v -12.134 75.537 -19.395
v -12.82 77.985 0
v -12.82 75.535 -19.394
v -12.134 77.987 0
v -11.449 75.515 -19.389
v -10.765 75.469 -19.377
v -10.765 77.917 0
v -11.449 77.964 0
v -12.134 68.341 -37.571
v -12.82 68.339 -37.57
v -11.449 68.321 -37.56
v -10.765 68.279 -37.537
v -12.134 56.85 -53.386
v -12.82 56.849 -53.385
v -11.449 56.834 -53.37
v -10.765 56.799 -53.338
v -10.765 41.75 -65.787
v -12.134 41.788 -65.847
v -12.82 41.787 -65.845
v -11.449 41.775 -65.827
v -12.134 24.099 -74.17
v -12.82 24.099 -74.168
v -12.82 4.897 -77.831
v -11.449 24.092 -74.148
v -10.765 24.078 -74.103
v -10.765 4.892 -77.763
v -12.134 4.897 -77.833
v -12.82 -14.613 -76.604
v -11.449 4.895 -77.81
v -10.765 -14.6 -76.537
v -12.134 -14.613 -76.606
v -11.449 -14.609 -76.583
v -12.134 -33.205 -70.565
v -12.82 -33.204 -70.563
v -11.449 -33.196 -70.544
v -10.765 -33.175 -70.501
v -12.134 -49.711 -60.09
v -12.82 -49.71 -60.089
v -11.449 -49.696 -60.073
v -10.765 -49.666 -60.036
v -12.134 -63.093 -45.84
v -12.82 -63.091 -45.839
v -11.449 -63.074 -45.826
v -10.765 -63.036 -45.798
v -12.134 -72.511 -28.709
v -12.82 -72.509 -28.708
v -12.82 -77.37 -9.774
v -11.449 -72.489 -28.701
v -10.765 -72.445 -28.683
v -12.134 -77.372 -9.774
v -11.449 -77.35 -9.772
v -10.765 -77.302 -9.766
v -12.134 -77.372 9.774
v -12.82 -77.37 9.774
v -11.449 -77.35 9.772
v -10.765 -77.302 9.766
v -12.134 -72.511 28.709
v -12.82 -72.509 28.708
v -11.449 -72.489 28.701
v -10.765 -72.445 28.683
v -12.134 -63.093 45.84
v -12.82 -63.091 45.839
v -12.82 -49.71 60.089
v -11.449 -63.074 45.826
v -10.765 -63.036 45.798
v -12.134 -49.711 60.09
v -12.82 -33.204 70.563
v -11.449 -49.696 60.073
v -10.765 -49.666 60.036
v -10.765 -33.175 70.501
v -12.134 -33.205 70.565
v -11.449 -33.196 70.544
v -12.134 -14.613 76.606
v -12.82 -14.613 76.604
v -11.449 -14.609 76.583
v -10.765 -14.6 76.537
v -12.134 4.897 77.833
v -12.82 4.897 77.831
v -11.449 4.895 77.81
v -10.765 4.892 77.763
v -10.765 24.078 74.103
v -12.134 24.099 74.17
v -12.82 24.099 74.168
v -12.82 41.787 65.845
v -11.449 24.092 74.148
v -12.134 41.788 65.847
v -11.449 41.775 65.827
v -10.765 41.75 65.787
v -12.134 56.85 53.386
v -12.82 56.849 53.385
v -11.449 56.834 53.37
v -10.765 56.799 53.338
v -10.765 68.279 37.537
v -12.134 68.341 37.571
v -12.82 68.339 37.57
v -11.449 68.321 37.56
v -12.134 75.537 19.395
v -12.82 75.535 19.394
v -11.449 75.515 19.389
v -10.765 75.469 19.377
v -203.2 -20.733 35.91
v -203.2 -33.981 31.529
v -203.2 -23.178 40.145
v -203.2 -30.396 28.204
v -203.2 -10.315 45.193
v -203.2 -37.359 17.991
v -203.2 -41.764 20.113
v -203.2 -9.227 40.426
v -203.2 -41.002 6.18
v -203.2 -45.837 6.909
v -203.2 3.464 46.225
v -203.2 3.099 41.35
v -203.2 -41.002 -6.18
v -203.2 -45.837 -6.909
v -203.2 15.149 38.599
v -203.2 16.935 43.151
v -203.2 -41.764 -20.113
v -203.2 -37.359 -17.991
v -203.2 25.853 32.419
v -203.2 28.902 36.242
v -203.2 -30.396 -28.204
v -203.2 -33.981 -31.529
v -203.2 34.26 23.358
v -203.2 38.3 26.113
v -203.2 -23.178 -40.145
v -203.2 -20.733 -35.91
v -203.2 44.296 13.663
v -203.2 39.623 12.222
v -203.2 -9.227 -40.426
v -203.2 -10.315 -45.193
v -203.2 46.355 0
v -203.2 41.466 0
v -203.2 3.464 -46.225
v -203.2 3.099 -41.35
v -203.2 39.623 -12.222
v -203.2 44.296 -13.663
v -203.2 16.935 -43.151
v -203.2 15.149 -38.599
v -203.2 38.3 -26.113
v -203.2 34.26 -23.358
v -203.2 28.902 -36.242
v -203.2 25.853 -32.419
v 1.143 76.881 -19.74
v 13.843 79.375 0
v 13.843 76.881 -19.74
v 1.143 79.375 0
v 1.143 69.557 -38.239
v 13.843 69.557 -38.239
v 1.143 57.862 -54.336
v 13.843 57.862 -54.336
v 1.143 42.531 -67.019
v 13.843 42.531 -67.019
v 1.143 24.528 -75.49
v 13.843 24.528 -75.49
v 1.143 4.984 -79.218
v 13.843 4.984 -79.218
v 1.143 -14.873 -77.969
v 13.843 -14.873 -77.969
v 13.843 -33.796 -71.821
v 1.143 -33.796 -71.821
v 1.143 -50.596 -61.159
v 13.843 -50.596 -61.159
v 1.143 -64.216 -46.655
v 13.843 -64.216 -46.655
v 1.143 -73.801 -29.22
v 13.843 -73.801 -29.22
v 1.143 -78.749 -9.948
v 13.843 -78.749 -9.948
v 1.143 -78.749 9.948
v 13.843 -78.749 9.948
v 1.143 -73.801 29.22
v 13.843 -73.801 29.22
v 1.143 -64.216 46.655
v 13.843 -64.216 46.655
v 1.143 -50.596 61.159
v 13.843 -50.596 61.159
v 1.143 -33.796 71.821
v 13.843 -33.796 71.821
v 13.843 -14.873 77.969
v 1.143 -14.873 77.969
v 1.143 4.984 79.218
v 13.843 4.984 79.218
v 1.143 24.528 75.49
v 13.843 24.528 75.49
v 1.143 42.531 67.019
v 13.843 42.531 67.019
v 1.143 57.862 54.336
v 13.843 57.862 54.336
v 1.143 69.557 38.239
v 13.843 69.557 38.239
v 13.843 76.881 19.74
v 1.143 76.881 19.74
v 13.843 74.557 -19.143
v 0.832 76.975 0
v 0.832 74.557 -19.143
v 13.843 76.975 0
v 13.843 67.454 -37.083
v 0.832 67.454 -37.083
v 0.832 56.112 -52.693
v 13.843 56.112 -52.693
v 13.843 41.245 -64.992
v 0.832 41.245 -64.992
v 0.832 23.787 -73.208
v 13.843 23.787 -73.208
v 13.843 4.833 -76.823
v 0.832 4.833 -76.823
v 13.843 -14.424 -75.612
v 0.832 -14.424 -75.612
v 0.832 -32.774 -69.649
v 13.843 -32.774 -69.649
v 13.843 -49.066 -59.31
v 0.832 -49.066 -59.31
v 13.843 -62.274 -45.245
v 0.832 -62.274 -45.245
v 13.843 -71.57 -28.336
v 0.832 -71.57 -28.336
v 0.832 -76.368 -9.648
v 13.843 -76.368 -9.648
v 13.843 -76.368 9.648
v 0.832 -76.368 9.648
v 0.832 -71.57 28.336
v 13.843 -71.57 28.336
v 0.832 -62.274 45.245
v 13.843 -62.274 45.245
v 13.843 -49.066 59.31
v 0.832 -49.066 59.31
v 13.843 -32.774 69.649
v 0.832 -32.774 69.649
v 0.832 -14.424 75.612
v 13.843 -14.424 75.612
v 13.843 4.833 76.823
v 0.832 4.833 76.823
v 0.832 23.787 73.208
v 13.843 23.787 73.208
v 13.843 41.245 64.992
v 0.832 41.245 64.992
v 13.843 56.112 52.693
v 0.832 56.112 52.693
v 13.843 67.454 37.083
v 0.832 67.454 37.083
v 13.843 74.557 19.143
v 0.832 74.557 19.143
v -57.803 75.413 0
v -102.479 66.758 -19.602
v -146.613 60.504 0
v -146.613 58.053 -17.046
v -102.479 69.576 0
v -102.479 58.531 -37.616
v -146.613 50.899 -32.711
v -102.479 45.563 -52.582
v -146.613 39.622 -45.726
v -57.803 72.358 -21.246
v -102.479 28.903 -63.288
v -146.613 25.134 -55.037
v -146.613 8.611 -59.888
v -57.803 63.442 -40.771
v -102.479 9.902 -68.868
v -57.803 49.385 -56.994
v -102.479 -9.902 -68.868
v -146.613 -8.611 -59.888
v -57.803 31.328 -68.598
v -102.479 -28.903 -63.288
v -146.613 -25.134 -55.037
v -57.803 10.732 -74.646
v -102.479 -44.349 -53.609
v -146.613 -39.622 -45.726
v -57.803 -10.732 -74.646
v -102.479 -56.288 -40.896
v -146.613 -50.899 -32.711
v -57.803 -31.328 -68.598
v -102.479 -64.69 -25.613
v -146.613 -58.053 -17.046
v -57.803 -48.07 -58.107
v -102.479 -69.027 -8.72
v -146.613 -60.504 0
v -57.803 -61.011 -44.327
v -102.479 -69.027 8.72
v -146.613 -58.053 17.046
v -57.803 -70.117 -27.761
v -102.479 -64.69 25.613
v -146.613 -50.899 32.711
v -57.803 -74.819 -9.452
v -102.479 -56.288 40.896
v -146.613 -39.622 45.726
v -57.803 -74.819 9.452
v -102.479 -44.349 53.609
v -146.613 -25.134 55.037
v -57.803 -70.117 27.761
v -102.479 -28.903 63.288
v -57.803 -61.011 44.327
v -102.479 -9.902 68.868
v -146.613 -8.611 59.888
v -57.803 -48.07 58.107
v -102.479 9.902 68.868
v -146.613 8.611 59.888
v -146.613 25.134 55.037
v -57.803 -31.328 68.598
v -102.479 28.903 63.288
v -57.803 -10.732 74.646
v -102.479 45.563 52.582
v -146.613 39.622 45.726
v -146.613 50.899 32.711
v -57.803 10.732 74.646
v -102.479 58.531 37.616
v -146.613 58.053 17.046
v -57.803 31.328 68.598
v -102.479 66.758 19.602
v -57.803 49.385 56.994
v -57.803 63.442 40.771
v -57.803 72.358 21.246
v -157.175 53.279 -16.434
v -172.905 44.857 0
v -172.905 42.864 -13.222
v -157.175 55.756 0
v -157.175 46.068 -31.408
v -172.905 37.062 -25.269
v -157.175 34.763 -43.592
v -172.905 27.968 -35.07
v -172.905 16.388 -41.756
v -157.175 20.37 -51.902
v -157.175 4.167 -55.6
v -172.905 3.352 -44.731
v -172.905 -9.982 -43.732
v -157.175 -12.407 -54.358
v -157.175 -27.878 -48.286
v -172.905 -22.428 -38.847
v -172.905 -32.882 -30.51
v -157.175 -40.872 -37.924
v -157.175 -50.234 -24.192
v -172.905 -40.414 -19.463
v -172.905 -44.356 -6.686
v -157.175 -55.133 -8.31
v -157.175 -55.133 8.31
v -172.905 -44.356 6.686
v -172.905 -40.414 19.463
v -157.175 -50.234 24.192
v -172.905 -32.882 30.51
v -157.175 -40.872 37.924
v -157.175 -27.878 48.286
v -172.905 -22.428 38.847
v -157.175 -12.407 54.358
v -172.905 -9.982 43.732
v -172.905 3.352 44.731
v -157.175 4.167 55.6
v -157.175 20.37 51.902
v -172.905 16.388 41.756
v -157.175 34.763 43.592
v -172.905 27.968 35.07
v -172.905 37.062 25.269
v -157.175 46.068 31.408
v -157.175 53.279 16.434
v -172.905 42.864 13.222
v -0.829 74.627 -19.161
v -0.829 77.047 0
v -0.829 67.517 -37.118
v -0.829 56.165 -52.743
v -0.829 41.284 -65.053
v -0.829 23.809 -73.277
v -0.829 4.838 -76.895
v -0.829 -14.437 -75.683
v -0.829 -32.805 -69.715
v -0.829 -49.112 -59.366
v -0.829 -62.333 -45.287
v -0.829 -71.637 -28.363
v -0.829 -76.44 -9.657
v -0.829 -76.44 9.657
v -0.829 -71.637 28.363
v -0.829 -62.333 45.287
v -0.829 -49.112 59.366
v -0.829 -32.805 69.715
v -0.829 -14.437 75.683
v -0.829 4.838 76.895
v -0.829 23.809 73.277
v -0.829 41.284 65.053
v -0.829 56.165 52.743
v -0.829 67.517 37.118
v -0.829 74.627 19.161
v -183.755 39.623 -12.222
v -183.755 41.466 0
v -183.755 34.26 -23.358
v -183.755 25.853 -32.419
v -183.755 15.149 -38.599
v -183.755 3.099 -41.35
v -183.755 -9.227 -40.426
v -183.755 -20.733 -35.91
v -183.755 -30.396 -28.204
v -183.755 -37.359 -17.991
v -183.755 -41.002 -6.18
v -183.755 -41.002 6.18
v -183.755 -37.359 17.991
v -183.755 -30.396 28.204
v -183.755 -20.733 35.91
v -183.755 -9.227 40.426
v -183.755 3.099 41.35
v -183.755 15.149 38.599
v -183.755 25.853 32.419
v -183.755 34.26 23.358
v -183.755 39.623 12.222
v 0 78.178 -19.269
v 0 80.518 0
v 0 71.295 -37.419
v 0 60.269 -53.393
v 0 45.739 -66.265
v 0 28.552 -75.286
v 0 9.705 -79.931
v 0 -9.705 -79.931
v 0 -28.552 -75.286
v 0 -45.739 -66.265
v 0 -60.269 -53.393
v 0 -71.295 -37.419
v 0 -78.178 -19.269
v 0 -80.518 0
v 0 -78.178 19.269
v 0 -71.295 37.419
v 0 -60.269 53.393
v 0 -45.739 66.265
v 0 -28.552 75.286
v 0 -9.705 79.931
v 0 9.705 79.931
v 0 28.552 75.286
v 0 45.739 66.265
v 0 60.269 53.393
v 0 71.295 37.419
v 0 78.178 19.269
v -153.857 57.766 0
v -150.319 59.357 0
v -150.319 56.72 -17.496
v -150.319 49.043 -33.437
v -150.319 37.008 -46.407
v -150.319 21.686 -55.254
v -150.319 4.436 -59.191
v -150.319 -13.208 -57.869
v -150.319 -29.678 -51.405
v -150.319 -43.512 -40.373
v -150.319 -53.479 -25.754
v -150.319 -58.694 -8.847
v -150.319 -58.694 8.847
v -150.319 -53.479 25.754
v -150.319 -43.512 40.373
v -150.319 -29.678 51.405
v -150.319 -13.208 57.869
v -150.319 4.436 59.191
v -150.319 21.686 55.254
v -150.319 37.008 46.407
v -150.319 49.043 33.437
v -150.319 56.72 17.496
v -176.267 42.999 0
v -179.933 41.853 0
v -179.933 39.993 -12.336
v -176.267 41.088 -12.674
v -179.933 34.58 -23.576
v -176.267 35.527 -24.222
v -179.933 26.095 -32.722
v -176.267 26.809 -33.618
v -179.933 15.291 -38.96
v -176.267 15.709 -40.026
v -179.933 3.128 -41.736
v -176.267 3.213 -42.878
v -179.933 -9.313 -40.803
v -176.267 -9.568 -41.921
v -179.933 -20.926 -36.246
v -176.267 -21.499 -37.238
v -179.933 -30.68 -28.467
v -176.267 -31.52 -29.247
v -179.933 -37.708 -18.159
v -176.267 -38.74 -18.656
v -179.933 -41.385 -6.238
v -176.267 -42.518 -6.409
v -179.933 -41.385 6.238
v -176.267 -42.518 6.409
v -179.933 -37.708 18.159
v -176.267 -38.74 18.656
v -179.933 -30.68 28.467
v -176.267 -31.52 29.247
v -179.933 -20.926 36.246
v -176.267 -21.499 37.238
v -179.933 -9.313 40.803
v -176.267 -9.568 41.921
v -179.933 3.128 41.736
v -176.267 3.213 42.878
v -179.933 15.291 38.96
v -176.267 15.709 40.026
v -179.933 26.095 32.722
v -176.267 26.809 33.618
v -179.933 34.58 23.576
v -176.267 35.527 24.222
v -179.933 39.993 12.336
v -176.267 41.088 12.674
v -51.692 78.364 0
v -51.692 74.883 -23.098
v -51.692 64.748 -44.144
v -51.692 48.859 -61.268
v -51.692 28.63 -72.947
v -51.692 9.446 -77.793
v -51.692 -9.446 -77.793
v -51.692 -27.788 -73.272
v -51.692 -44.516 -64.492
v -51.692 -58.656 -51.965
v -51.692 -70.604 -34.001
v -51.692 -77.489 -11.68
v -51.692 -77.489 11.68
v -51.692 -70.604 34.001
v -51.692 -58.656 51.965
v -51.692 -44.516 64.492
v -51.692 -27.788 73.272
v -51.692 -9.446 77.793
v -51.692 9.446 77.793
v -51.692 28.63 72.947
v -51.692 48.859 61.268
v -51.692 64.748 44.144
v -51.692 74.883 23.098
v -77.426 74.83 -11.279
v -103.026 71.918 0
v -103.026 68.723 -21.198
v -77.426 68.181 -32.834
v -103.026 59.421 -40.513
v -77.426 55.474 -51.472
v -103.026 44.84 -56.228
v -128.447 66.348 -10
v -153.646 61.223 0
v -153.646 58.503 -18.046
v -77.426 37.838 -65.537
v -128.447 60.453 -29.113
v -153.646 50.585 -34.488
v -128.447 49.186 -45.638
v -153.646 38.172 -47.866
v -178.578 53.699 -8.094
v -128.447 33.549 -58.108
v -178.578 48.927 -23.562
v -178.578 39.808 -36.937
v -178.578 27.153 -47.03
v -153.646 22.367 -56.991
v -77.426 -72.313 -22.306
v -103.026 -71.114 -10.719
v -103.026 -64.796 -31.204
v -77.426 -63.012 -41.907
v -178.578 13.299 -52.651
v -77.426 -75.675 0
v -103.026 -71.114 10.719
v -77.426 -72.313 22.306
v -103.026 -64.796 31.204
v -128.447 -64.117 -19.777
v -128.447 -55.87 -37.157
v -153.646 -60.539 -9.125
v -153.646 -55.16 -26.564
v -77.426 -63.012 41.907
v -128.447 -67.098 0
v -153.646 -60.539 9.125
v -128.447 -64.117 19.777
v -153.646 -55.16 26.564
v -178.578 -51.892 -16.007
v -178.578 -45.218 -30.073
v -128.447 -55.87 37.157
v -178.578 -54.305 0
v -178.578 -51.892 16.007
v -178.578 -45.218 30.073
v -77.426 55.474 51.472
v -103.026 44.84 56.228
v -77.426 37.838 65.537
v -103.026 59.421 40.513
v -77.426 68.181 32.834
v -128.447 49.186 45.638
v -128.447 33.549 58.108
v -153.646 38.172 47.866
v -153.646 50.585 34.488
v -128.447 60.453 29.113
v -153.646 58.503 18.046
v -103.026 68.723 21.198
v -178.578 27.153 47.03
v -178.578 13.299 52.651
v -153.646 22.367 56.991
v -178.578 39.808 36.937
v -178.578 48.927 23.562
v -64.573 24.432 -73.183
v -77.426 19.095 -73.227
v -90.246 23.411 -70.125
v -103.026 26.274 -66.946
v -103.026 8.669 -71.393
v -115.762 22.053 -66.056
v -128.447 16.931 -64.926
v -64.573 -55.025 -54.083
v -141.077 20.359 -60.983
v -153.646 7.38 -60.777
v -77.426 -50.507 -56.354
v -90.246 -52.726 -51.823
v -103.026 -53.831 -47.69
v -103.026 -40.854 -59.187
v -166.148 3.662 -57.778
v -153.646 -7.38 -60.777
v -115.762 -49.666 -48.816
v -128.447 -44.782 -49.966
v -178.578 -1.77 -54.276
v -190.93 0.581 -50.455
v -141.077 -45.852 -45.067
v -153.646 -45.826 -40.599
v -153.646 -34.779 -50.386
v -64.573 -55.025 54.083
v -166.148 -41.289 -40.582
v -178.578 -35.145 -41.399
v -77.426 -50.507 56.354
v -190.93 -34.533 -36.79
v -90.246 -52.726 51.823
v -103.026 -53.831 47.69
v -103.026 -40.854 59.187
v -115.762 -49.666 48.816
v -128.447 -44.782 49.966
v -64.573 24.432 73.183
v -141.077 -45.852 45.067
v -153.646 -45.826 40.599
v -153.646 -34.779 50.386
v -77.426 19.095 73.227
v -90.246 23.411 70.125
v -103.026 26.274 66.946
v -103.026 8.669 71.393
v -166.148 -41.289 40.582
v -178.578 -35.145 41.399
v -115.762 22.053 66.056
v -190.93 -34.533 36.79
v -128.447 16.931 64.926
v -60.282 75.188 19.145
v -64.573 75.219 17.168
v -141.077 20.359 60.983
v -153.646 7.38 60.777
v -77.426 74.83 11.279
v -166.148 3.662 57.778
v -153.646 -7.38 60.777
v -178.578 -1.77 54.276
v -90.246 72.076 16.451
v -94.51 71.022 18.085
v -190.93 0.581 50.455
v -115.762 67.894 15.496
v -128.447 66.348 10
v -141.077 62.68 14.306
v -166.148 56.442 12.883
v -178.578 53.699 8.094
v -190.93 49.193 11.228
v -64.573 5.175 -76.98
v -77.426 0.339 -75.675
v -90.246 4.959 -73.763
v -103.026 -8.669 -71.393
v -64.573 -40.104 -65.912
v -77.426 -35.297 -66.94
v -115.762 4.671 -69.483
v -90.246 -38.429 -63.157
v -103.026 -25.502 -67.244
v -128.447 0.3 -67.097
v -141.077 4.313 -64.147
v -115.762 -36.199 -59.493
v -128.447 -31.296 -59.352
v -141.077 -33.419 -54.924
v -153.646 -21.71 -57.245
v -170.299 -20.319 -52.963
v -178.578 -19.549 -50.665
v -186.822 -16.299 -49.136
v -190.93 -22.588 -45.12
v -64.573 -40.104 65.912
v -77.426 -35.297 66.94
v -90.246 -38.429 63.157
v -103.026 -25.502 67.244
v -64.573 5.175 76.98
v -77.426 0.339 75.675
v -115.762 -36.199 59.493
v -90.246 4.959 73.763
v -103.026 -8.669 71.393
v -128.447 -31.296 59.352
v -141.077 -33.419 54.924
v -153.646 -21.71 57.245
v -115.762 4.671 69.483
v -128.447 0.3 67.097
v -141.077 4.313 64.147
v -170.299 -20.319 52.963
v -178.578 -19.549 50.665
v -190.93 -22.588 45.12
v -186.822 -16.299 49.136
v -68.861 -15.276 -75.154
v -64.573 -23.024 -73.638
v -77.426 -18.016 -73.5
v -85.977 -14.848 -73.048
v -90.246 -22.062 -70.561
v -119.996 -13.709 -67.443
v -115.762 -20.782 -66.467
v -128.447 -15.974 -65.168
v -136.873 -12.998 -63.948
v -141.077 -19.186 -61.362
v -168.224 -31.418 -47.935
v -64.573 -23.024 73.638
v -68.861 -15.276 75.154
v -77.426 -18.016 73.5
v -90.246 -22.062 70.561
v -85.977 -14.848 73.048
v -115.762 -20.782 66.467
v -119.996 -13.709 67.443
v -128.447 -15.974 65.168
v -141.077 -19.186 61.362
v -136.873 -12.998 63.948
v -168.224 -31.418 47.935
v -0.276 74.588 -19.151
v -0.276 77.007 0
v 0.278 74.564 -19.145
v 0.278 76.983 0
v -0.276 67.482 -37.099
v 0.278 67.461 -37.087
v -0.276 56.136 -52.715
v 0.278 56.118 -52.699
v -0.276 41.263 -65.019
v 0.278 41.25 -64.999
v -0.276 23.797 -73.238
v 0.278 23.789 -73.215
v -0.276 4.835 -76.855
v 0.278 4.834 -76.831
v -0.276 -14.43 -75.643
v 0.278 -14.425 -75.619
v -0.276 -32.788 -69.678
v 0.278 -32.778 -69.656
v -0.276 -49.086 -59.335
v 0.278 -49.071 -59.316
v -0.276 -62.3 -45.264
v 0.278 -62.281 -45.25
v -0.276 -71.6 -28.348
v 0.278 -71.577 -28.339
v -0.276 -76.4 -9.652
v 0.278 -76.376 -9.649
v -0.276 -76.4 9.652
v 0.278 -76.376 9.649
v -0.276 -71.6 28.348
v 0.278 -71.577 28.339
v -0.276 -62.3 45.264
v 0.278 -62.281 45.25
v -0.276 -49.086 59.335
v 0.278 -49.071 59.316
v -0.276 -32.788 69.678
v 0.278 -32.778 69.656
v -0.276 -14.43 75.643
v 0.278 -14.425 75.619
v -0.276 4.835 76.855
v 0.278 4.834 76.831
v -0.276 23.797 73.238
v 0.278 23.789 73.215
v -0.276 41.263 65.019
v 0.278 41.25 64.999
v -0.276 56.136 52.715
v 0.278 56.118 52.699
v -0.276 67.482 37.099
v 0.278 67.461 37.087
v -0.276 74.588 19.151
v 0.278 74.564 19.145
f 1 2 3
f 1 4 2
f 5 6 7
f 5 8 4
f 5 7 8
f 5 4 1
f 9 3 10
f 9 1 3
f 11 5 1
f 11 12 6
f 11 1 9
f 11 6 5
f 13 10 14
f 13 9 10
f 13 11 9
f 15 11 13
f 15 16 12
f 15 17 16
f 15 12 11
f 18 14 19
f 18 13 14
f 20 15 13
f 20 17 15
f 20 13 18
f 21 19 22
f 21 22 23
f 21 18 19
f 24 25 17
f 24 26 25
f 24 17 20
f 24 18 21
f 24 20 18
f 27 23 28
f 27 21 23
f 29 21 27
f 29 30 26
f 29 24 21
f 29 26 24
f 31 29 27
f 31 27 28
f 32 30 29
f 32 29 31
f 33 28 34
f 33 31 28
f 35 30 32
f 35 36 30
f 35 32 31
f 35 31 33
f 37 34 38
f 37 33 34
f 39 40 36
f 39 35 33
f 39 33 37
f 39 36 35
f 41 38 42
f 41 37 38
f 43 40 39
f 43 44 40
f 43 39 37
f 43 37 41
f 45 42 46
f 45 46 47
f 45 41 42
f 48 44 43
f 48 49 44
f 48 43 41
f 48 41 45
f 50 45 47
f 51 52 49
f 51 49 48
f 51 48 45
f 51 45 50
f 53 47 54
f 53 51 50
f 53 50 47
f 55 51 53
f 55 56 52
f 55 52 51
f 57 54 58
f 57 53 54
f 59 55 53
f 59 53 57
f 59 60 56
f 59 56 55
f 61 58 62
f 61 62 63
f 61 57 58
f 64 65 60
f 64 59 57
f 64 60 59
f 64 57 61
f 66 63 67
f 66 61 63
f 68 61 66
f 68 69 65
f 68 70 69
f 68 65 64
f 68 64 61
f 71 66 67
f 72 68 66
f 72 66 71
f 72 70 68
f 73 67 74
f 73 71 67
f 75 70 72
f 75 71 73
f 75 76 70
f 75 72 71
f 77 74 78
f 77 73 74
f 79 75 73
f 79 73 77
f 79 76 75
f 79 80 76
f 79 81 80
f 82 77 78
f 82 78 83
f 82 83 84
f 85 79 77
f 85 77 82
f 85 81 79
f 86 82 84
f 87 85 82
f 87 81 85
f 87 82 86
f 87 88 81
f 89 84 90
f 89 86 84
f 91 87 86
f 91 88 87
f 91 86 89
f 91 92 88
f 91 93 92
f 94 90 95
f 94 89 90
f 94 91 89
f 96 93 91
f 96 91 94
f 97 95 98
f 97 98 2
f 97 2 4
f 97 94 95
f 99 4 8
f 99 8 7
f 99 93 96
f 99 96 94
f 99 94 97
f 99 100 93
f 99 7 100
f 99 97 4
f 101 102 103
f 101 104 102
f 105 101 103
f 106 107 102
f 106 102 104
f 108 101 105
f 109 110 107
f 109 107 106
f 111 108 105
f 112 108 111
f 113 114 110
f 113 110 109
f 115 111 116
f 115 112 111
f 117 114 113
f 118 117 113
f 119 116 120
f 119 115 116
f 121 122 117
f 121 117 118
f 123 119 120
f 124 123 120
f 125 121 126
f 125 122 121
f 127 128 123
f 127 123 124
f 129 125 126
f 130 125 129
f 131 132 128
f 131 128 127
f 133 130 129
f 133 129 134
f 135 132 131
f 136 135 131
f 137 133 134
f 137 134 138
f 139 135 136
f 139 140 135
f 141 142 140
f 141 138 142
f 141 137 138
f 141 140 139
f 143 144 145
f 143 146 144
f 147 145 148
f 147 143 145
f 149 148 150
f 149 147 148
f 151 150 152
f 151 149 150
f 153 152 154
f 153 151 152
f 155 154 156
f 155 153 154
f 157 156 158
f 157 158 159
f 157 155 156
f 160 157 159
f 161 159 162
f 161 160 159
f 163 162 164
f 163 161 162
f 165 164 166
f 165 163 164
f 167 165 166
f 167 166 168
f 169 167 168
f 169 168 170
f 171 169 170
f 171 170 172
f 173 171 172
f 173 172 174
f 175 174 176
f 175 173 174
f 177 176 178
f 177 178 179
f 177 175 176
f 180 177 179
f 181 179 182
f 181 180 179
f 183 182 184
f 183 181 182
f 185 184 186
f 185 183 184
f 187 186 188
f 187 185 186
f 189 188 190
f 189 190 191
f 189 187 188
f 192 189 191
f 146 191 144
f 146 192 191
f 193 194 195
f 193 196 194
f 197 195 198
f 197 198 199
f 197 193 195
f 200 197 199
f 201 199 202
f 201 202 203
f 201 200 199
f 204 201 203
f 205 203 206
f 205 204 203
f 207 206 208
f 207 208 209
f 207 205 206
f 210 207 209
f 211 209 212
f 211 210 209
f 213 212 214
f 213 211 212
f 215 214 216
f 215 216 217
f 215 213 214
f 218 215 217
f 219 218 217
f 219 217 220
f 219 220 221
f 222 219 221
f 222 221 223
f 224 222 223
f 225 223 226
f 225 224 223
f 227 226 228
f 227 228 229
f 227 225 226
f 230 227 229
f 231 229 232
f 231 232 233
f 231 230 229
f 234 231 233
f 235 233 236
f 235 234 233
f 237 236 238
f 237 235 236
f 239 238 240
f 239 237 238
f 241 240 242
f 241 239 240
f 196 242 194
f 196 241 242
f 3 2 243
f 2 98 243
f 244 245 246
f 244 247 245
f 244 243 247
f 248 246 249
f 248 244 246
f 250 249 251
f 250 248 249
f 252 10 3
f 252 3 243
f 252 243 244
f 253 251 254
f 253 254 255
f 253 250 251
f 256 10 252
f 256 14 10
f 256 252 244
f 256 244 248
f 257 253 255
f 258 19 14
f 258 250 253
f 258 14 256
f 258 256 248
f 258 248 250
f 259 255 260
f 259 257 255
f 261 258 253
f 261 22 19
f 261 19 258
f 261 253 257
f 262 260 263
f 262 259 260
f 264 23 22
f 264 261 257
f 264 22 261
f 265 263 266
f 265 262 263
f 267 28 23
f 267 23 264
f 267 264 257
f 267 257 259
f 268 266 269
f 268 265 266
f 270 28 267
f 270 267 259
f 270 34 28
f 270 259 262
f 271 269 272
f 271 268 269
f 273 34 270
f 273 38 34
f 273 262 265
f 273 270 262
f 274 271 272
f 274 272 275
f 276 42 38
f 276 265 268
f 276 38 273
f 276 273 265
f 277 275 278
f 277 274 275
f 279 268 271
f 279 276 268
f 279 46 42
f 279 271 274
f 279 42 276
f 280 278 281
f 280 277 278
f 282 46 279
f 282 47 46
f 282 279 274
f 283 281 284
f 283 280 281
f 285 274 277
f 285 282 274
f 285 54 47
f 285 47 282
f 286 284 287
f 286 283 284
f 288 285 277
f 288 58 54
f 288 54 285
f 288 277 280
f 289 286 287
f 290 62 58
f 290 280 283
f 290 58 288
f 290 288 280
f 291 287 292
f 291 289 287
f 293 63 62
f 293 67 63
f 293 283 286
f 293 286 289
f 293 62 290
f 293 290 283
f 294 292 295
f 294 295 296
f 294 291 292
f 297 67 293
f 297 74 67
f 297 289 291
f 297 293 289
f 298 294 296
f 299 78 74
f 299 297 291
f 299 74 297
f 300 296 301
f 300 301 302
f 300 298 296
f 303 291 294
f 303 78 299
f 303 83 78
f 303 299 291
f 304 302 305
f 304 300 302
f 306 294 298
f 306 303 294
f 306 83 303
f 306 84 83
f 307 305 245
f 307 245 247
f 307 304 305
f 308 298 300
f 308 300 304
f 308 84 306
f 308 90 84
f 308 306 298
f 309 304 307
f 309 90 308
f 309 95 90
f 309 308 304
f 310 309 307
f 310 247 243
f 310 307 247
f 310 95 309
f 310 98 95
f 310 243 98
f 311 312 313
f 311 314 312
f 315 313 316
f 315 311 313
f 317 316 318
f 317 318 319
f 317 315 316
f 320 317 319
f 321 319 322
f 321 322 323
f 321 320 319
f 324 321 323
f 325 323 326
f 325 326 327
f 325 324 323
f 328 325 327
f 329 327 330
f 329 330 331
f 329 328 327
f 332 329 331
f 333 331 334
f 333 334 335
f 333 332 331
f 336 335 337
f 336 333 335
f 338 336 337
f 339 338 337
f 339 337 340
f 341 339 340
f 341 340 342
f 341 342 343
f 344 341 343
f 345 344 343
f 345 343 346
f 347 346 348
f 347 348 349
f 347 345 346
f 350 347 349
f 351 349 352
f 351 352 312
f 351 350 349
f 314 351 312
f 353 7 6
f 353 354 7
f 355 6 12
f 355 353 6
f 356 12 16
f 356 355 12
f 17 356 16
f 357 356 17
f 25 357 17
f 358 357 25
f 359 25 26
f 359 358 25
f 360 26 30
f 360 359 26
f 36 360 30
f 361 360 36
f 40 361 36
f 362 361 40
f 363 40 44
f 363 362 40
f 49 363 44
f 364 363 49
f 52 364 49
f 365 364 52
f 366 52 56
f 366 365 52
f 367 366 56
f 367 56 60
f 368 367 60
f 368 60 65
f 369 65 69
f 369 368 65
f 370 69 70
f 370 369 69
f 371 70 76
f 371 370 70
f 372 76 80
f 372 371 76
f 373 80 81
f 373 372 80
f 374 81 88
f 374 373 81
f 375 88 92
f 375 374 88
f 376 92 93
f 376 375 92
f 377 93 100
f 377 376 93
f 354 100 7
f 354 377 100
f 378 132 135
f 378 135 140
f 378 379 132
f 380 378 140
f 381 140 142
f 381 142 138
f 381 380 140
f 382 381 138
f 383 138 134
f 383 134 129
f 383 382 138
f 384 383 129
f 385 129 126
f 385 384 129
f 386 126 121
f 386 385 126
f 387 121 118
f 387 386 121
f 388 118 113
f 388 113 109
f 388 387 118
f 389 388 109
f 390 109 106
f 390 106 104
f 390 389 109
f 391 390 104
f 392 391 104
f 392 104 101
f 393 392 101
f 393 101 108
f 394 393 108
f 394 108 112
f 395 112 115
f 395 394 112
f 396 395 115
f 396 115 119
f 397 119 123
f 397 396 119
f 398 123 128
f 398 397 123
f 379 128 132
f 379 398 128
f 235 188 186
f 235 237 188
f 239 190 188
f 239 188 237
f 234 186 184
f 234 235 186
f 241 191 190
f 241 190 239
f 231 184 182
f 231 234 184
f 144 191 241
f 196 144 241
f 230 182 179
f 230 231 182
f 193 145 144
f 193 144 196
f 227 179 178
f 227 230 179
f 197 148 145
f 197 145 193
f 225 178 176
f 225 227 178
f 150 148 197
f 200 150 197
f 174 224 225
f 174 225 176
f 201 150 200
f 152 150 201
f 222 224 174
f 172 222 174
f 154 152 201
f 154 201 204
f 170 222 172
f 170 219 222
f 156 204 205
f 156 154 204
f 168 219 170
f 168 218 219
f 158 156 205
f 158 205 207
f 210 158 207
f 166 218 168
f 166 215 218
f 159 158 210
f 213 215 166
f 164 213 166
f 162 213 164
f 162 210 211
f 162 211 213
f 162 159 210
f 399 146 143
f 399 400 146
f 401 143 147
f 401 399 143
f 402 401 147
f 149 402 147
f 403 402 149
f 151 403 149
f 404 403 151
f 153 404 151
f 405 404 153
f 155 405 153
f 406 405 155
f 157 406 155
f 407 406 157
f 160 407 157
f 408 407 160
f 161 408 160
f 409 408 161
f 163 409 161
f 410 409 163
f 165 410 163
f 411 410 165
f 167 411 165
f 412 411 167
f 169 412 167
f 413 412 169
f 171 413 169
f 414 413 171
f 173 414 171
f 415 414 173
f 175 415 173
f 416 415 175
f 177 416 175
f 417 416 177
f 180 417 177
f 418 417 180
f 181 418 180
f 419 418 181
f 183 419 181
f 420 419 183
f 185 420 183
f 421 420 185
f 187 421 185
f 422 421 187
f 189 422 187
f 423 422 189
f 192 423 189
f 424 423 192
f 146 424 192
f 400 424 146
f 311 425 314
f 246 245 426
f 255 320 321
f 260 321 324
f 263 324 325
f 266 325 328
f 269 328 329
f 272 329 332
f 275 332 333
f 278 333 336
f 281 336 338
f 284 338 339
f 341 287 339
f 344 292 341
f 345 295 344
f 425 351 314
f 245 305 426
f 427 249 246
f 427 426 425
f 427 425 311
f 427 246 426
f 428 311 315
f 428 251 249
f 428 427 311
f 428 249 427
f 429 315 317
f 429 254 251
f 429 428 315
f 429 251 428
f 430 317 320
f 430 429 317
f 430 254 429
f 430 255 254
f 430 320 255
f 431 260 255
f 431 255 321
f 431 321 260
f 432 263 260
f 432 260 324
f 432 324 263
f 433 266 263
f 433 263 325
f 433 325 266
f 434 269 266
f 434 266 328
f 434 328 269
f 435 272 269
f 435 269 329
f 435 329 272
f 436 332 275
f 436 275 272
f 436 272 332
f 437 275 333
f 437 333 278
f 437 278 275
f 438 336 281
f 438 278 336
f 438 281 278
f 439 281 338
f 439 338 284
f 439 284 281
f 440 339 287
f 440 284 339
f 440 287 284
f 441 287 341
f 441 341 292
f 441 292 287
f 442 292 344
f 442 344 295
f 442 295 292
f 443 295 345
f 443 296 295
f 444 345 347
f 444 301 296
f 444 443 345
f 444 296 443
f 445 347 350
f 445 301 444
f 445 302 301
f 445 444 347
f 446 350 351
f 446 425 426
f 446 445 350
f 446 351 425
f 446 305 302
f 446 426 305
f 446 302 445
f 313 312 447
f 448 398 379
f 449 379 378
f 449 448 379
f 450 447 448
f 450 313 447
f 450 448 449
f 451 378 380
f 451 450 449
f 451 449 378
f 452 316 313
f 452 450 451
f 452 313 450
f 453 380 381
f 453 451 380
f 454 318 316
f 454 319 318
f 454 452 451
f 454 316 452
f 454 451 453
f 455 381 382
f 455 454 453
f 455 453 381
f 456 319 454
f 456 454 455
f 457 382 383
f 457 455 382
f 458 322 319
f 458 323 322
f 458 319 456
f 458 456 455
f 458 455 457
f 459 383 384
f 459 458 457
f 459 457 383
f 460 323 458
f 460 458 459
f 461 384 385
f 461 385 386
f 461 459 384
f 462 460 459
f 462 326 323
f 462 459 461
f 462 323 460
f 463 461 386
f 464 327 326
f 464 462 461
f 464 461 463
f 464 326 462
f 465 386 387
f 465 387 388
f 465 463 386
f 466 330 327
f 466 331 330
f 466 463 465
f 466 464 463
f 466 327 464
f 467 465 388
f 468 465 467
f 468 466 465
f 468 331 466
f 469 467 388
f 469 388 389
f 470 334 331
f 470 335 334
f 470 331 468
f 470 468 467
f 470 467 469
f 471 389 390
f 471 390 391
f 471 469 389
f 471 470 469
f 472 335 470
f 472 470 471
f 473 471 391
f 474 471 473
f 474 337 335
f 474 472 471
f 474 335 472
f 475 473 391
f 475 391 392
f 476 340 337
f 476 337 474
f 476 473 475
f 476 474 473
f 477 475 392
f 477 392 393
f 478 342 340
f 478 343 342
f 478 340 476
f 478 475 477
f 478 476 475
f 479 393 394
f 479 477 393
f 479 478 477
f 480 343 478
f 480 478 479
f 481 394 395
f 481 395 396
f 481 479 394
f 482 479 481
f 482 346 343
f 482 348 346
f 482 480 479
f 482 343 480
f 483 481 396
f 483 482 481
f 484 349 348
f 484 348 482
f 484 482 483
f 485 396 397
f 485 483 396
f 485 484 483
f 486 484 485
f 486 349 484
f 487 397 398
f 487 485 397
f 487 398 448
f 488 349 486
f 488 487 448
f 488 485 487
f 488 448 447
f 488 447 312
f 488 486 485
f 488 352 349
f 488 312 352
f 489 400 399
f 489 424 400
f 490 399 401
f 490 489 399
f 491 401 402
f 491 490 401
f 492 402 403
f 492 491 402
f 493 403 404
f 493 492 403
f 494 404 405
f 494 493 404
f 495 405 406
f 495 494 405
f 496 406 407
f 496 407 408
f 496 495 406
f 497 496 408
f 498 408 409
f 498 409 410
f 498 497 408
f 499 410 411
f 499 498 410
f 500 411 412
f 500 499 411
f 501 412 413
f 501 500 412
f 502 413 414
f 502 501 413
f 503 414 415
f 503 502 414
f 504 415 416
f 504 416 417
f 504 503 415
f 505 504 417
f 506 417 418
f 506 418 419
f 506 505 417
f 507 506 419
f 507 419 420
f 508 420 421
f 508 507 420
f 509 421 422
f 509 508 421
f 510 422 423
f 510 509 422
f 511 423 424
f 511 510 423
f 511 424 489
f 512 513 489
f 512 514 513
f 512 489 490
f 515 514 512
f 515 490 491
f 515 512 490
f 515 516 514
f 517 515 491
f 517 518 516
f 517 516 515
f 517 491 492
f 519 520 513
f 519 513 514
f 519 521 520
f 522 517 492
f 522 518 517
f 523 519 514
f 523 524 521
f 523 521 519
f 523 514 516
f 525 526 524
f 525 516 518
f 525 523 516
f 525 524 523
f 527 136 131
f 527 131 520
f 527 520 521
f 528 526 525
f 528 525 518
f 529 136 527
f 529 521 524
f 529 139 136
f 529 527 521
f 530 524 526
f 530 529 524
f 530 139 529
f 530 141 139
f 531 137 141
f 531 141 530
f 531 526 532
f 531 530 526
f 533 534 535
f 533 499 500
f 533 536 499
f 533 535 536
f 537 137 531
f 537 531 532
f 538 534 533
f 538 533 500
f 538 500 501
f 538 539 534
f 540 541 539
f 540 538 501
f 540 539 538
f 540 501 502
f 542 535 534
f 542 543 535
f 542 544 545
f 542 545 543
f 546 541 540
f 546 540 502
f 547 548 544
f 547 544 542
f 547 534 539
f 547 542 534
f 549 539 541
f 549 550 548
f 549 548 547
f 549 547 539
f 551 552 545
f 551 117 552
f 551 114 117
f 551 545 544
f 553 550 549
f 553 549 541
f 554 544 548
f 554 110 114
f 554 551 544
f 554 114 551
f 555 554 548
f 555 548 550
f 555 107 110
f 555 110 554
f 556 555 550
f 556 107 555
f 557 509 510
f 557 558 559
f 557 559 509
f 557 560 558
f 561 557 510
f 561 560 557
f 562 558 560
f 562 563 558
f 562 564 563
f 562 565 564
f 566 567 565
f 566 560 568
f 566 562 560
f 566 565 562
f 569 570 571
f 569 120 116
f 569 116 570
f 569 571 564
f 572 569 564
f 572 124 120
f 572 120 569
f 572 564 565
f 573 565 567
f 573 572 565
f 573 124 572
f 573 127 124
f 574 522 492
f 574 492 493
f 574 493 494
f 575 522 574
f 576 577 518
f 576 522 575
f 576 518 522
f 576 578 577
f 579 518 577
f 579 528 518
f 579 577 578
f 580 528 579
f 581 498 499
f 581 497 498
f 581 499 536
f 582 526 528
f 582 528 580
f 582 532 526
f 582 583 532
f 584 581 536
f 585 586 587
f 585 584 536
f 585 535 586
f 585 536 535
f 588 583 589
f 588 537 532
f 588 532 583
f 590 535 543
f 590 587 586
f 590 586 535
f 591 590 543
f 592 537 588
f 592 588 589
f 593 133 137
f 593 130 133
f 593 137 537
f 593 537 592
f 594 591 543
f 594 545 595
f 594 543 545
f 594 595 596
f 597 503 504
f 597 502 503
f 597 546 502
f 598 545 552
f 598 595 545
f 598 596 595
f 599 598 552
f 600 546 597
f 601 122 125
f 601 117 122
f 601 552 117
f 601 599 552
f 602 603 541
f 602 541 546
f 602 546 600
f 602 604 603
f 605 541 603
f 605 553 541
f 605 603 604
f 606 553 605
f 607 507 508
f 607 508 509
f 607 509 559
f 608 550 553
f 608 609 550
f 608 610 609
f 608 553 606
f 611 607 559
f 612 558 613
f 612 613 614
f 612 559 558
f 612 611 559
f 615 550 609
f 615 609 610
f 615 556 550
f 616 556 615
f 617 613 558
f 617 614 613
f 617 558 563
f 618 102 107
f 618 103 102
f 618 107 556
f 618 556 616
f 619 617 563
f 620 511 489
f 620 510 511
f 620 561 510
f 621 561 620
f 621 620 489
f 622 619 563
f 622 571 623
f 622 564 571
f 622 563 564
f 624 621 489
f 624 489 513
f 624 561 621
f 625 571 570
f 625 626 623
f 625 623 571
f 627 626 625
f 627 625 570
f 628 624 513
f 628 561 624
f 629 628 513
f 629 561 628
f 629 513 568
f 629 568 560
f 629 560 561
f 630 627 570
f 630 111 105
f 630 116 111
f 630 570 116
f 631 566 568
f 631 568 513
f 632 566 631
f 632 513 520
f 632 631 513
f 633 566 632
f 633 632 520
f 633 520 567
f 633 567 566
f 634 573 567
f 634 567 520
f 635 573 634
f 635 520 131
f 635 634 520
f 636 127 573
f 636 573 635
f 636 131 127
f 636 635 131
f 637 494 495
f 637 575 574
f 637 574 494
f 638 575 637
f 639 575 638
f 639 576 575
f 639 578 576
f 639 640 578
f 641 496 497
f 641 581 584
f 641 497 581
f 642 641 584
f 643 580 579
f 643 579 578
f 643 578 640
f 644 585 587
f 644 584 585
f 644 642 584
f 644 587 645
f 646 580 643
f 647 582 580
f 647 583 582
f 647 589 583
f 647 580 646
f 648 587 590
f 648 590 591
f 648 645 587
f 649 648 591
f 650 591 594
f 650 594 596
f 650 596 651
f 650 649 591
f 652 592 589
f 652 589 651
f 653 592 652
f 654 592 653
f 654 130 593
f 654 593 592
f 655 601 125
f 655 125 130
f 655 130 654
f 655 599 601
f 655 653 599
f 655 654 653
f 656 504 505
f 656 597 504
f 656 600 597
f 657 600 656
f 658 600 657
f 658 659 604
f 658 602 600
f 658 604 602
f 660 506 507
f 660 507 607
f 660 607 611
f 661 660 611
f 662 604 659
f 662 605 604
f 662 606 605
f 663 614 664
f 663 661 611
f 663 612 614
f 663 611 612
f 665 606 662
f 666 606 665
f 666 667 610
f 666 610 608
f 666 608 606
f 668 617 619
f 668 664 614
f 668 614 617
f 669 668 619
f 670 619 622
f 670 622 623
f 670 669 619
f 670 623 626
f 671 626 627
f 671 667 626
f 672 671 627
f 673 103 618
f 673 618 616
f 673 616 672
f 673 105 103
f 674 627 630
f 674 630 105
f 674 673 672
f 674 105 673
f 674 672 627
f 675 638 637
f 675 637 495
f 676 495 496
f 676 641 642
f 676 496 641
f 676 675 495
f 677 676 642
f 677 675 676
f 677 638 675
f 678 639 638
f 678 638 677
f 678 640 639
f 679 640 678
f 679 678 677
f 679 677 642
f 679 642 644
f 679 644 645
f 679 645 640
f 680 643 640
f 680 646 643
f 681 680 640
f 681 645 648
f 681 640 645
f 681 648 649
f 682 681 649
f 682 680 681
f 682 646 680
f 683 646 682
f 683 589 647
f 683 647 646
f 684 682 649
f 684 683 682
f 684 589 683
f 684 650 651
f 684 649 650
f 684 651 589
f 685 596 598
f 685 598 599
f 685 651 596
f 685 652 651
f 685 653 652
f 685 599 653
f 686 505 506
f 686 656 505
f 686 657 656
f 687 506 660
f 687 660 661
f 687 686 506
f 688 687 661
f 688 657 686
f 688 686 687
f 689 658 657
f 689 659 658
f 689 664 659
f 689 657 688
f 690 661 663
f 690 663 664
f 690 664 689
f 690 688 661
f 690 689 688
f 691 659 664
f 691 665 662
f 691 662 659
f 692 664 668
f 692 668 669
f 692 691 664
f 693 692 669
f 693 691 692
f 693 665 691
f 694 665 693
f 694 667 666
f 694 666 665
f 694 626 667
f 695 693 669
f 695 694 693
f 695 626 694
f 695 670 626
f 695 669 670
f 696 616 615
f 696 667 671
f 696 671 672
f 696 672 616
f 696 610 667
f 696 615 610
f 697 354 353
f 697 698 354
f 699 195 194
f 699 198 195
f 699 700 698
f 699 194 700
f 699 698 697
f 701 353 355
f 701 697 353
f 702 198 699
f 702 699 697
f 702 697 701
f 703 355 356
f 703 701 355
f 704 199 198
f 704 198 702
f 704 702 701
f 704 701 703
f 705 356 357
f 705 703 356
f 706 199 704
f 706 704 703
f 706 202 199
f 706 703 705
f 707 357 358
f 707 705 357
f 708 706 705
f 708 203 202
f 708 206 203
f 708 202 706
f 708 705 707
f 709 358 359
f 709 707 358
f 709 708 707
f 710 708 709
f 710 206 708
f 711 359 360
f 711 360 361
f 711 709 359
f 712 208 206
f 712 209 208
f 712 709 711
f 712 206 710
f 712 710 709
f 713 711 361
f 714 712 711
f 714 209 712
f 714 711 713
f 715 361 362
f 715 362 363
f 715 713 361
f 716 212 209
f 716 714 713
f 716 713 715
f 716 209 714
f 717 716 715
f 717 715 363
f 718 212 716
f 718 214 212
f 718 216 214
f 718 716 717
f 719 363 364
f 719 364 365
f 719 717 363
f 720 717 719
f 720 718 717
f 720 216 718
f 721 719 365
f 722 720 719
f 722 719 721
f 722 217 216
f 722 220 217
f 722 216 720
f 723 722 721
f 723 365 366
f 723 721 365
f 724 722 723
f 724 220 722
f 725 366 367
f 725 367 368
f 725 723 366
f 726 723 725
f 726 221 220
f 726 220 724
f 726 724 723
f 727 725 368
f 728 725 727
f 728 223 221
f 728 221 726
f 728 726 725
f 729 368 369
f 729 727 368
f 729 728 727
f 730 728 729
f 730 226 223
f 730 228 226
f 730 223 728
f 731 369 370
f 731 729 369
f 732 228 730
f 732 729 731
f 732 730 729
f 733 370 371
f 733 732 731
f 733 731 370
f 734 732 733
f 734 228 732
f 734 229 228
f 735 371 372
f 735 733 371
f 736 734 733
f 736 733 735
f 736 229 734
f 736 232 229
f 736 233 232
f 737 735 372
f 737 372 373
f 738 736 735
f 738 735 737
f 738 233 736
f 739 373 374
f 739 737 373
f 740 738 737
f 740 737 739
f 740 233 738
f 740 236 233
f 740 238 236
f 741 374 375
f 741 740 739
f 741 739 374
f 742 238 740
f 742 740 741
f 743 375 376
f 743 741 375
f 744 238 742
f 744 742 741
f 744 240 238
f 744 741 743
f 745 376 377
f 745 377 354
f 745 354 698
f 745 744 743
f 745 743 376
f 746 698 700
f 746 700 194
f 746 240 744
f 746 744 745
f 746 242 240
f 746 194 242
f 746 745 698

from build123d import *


with BuildPart() as part:
    # Sketch1 → Revolve1 (revolve)
    with BuildSketch(Plane.XY):
        with BuildLine():
            Line((-203.2, 46.355), (-203.2, 41.4655))
            Line((-203.2, 41.4655), (-183.754587886, 41.4655))
            ThreePointArc((-183.754587886, 41.4655), (-178.071177239, 42.333053976), (-172.905421762, 44.856697542))
            Line((-172.905421762, 44.856697542), (-157.174655244, 55.755723803))
            ThreePointArc((-157.174655244, 55.755723803), (-152.112106925, 58.615583027), (-146.612916839, 60.504259459))
            ThreePointArc((-146.612916839, 60.504259459), (-80.194180108, 72.901209652), (-12.819958692, 77.985228898))
            ThreePointArc((-12.819958692, 77.985228898), (-11.791604784, 77.978768405), (-10.765097896, 77.916824028))
            Line((-10.765097896, 77.916824028), (-0.828575937, 77.047491001))
            ThreePointArc((-0.828575937, 77.047491001), (0.000791633, 76.993131379), (0.831740962, 76.975))
            Line((0.831740962, 76.975), (13.843, 76.975))
            Line((13.843, 76.975), (13.843, 79.375))
            Line((13.843, 79.375), (1.143, 79.375))
            Line((1.143, 79.375), (0, 80.518))
            ThreePointArc((0, 80.518), (-103.025907626, 71.917734953), (-203.2, 46.355))
        make_face()
    revolve(axis=Axis((0, 0, 0), (-1, 0, 0)))


solid = part.part
